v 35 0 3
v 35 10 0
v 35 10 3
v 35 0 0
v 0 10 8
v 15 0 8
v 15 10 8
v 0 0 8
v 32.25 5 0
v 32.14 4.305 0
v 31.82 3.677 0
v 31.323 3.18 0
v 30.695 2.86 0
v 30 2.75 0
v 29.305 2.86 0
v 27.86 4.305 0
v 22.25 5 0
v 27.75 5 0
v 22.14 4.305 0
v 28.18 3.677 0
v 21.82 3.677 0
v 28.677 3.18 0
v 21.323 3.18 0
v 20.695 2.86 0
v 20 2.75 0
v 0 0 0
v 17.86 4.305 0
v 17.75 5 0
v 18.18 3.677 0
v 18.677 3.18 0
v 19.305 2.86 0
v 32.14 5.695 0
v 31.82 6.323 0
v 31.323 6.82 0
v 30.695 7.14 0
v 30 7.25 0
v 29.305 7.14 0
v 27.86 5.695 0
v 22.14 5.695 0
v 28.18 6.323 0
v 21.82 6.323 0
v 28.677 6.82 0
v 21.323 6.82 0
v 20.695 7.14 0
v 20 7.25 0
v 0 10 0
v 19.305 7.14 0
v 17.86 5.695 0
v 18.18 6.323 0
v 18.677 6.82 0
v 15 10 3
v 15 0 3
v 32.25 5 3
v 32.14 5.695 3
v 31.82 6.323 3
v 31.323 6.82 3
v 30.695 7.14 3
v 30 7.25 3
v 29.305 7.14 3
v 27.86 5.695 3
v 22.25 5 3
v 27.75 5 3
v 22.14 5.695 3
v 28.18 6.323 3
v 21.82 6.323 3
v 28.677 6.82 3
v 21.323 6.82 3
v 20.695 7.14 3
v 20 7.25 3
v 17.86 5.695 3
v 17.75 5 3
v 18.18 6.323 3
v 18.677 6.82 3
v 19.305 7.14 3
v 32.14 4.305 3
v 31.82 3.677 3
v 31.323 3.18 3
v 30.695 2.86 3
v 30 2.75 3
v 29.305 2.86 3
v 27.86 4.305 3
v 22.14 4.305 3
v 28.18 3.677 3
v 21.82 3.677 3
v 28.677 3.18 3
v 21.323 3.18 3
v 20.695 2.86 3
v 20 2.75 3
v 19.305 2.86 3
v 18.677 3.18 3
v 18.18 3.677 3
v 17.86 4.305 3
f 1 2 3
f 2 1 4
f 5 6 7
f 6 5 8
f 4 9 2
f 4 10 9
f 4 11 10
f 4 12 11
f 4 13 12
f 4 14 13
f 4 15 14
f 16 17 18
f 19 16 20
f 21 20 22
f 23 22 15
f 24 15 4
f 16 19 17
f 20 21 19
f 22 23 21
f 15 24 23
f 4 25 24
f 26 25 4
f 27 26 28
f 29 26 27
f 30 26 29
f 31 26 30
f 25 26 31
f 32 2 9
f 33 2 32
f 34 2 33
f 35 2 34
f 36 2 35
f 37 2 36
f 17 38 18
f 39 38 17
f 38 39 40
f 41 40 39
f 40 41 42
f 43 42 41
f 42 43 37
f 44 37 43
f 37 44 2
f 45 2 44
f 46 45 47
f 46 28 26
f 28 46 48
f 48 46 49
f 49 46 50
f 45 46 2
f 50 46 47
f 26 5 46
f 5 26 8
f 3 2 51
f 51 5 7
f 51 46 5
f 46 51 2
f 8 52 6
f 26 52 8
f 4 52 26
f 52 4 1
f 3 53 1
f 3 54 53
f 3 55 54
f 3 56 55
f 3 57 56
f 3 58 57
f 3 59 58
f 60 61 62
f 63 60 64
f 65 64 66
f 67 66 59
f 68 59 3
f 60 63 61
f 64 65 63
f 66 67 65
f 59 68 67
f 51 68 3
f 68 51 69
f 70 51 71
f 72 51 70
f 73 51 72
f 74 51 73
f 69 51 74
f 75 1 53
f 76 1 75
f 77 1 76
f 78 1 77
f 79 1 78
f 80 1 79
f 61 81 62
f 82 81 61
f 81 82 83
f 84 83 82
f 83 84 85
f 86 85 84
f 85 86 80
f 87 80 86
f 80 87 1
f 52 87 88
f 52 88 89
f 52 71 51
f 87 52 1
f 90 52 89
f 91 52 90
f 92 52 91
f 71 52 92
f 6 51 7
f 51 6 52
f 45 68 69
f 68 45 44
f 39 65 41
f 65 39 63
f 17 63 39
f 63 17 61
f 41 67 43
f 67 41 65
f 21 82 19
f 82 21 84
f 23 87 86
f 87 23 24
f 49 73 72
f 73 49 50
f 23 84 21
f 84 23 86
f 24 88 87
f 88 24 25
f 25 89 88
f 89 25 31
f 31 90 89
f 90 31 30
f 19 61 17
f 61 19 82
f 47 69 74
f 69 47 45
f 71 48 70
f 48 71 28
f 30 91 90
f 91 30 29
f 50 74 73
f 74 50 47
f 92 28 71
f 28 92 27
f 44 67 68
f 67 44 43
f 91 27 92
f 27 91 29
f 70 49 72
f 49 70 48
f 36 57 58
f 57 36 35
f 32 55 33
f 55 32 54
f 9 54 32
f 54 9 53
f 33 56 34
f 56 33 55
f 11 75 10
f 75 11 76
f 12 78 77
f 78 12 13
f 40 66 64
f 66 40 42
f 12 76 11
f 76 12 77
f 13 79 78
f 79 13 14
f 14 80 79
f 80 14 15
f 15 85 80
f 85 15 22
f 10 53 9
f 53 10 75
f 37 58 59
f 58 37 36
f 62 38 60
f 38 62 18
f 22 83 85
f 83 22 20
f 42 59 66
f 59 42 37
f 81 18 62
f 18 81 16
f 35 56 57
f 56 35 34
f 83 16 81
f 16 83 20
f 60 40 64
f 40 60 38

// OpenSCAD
module bolt(){
    cylinder(r=2.25,h=25,$fn=20);
}

bolt1 = 20;
difference(){
    cube([35,10,8]);
    translate([15,0,3])cube([20,10,5]);
    translate([bolt1,5,0])bolt();
    translate([(bolt1+10),5,0])bolt();
}
